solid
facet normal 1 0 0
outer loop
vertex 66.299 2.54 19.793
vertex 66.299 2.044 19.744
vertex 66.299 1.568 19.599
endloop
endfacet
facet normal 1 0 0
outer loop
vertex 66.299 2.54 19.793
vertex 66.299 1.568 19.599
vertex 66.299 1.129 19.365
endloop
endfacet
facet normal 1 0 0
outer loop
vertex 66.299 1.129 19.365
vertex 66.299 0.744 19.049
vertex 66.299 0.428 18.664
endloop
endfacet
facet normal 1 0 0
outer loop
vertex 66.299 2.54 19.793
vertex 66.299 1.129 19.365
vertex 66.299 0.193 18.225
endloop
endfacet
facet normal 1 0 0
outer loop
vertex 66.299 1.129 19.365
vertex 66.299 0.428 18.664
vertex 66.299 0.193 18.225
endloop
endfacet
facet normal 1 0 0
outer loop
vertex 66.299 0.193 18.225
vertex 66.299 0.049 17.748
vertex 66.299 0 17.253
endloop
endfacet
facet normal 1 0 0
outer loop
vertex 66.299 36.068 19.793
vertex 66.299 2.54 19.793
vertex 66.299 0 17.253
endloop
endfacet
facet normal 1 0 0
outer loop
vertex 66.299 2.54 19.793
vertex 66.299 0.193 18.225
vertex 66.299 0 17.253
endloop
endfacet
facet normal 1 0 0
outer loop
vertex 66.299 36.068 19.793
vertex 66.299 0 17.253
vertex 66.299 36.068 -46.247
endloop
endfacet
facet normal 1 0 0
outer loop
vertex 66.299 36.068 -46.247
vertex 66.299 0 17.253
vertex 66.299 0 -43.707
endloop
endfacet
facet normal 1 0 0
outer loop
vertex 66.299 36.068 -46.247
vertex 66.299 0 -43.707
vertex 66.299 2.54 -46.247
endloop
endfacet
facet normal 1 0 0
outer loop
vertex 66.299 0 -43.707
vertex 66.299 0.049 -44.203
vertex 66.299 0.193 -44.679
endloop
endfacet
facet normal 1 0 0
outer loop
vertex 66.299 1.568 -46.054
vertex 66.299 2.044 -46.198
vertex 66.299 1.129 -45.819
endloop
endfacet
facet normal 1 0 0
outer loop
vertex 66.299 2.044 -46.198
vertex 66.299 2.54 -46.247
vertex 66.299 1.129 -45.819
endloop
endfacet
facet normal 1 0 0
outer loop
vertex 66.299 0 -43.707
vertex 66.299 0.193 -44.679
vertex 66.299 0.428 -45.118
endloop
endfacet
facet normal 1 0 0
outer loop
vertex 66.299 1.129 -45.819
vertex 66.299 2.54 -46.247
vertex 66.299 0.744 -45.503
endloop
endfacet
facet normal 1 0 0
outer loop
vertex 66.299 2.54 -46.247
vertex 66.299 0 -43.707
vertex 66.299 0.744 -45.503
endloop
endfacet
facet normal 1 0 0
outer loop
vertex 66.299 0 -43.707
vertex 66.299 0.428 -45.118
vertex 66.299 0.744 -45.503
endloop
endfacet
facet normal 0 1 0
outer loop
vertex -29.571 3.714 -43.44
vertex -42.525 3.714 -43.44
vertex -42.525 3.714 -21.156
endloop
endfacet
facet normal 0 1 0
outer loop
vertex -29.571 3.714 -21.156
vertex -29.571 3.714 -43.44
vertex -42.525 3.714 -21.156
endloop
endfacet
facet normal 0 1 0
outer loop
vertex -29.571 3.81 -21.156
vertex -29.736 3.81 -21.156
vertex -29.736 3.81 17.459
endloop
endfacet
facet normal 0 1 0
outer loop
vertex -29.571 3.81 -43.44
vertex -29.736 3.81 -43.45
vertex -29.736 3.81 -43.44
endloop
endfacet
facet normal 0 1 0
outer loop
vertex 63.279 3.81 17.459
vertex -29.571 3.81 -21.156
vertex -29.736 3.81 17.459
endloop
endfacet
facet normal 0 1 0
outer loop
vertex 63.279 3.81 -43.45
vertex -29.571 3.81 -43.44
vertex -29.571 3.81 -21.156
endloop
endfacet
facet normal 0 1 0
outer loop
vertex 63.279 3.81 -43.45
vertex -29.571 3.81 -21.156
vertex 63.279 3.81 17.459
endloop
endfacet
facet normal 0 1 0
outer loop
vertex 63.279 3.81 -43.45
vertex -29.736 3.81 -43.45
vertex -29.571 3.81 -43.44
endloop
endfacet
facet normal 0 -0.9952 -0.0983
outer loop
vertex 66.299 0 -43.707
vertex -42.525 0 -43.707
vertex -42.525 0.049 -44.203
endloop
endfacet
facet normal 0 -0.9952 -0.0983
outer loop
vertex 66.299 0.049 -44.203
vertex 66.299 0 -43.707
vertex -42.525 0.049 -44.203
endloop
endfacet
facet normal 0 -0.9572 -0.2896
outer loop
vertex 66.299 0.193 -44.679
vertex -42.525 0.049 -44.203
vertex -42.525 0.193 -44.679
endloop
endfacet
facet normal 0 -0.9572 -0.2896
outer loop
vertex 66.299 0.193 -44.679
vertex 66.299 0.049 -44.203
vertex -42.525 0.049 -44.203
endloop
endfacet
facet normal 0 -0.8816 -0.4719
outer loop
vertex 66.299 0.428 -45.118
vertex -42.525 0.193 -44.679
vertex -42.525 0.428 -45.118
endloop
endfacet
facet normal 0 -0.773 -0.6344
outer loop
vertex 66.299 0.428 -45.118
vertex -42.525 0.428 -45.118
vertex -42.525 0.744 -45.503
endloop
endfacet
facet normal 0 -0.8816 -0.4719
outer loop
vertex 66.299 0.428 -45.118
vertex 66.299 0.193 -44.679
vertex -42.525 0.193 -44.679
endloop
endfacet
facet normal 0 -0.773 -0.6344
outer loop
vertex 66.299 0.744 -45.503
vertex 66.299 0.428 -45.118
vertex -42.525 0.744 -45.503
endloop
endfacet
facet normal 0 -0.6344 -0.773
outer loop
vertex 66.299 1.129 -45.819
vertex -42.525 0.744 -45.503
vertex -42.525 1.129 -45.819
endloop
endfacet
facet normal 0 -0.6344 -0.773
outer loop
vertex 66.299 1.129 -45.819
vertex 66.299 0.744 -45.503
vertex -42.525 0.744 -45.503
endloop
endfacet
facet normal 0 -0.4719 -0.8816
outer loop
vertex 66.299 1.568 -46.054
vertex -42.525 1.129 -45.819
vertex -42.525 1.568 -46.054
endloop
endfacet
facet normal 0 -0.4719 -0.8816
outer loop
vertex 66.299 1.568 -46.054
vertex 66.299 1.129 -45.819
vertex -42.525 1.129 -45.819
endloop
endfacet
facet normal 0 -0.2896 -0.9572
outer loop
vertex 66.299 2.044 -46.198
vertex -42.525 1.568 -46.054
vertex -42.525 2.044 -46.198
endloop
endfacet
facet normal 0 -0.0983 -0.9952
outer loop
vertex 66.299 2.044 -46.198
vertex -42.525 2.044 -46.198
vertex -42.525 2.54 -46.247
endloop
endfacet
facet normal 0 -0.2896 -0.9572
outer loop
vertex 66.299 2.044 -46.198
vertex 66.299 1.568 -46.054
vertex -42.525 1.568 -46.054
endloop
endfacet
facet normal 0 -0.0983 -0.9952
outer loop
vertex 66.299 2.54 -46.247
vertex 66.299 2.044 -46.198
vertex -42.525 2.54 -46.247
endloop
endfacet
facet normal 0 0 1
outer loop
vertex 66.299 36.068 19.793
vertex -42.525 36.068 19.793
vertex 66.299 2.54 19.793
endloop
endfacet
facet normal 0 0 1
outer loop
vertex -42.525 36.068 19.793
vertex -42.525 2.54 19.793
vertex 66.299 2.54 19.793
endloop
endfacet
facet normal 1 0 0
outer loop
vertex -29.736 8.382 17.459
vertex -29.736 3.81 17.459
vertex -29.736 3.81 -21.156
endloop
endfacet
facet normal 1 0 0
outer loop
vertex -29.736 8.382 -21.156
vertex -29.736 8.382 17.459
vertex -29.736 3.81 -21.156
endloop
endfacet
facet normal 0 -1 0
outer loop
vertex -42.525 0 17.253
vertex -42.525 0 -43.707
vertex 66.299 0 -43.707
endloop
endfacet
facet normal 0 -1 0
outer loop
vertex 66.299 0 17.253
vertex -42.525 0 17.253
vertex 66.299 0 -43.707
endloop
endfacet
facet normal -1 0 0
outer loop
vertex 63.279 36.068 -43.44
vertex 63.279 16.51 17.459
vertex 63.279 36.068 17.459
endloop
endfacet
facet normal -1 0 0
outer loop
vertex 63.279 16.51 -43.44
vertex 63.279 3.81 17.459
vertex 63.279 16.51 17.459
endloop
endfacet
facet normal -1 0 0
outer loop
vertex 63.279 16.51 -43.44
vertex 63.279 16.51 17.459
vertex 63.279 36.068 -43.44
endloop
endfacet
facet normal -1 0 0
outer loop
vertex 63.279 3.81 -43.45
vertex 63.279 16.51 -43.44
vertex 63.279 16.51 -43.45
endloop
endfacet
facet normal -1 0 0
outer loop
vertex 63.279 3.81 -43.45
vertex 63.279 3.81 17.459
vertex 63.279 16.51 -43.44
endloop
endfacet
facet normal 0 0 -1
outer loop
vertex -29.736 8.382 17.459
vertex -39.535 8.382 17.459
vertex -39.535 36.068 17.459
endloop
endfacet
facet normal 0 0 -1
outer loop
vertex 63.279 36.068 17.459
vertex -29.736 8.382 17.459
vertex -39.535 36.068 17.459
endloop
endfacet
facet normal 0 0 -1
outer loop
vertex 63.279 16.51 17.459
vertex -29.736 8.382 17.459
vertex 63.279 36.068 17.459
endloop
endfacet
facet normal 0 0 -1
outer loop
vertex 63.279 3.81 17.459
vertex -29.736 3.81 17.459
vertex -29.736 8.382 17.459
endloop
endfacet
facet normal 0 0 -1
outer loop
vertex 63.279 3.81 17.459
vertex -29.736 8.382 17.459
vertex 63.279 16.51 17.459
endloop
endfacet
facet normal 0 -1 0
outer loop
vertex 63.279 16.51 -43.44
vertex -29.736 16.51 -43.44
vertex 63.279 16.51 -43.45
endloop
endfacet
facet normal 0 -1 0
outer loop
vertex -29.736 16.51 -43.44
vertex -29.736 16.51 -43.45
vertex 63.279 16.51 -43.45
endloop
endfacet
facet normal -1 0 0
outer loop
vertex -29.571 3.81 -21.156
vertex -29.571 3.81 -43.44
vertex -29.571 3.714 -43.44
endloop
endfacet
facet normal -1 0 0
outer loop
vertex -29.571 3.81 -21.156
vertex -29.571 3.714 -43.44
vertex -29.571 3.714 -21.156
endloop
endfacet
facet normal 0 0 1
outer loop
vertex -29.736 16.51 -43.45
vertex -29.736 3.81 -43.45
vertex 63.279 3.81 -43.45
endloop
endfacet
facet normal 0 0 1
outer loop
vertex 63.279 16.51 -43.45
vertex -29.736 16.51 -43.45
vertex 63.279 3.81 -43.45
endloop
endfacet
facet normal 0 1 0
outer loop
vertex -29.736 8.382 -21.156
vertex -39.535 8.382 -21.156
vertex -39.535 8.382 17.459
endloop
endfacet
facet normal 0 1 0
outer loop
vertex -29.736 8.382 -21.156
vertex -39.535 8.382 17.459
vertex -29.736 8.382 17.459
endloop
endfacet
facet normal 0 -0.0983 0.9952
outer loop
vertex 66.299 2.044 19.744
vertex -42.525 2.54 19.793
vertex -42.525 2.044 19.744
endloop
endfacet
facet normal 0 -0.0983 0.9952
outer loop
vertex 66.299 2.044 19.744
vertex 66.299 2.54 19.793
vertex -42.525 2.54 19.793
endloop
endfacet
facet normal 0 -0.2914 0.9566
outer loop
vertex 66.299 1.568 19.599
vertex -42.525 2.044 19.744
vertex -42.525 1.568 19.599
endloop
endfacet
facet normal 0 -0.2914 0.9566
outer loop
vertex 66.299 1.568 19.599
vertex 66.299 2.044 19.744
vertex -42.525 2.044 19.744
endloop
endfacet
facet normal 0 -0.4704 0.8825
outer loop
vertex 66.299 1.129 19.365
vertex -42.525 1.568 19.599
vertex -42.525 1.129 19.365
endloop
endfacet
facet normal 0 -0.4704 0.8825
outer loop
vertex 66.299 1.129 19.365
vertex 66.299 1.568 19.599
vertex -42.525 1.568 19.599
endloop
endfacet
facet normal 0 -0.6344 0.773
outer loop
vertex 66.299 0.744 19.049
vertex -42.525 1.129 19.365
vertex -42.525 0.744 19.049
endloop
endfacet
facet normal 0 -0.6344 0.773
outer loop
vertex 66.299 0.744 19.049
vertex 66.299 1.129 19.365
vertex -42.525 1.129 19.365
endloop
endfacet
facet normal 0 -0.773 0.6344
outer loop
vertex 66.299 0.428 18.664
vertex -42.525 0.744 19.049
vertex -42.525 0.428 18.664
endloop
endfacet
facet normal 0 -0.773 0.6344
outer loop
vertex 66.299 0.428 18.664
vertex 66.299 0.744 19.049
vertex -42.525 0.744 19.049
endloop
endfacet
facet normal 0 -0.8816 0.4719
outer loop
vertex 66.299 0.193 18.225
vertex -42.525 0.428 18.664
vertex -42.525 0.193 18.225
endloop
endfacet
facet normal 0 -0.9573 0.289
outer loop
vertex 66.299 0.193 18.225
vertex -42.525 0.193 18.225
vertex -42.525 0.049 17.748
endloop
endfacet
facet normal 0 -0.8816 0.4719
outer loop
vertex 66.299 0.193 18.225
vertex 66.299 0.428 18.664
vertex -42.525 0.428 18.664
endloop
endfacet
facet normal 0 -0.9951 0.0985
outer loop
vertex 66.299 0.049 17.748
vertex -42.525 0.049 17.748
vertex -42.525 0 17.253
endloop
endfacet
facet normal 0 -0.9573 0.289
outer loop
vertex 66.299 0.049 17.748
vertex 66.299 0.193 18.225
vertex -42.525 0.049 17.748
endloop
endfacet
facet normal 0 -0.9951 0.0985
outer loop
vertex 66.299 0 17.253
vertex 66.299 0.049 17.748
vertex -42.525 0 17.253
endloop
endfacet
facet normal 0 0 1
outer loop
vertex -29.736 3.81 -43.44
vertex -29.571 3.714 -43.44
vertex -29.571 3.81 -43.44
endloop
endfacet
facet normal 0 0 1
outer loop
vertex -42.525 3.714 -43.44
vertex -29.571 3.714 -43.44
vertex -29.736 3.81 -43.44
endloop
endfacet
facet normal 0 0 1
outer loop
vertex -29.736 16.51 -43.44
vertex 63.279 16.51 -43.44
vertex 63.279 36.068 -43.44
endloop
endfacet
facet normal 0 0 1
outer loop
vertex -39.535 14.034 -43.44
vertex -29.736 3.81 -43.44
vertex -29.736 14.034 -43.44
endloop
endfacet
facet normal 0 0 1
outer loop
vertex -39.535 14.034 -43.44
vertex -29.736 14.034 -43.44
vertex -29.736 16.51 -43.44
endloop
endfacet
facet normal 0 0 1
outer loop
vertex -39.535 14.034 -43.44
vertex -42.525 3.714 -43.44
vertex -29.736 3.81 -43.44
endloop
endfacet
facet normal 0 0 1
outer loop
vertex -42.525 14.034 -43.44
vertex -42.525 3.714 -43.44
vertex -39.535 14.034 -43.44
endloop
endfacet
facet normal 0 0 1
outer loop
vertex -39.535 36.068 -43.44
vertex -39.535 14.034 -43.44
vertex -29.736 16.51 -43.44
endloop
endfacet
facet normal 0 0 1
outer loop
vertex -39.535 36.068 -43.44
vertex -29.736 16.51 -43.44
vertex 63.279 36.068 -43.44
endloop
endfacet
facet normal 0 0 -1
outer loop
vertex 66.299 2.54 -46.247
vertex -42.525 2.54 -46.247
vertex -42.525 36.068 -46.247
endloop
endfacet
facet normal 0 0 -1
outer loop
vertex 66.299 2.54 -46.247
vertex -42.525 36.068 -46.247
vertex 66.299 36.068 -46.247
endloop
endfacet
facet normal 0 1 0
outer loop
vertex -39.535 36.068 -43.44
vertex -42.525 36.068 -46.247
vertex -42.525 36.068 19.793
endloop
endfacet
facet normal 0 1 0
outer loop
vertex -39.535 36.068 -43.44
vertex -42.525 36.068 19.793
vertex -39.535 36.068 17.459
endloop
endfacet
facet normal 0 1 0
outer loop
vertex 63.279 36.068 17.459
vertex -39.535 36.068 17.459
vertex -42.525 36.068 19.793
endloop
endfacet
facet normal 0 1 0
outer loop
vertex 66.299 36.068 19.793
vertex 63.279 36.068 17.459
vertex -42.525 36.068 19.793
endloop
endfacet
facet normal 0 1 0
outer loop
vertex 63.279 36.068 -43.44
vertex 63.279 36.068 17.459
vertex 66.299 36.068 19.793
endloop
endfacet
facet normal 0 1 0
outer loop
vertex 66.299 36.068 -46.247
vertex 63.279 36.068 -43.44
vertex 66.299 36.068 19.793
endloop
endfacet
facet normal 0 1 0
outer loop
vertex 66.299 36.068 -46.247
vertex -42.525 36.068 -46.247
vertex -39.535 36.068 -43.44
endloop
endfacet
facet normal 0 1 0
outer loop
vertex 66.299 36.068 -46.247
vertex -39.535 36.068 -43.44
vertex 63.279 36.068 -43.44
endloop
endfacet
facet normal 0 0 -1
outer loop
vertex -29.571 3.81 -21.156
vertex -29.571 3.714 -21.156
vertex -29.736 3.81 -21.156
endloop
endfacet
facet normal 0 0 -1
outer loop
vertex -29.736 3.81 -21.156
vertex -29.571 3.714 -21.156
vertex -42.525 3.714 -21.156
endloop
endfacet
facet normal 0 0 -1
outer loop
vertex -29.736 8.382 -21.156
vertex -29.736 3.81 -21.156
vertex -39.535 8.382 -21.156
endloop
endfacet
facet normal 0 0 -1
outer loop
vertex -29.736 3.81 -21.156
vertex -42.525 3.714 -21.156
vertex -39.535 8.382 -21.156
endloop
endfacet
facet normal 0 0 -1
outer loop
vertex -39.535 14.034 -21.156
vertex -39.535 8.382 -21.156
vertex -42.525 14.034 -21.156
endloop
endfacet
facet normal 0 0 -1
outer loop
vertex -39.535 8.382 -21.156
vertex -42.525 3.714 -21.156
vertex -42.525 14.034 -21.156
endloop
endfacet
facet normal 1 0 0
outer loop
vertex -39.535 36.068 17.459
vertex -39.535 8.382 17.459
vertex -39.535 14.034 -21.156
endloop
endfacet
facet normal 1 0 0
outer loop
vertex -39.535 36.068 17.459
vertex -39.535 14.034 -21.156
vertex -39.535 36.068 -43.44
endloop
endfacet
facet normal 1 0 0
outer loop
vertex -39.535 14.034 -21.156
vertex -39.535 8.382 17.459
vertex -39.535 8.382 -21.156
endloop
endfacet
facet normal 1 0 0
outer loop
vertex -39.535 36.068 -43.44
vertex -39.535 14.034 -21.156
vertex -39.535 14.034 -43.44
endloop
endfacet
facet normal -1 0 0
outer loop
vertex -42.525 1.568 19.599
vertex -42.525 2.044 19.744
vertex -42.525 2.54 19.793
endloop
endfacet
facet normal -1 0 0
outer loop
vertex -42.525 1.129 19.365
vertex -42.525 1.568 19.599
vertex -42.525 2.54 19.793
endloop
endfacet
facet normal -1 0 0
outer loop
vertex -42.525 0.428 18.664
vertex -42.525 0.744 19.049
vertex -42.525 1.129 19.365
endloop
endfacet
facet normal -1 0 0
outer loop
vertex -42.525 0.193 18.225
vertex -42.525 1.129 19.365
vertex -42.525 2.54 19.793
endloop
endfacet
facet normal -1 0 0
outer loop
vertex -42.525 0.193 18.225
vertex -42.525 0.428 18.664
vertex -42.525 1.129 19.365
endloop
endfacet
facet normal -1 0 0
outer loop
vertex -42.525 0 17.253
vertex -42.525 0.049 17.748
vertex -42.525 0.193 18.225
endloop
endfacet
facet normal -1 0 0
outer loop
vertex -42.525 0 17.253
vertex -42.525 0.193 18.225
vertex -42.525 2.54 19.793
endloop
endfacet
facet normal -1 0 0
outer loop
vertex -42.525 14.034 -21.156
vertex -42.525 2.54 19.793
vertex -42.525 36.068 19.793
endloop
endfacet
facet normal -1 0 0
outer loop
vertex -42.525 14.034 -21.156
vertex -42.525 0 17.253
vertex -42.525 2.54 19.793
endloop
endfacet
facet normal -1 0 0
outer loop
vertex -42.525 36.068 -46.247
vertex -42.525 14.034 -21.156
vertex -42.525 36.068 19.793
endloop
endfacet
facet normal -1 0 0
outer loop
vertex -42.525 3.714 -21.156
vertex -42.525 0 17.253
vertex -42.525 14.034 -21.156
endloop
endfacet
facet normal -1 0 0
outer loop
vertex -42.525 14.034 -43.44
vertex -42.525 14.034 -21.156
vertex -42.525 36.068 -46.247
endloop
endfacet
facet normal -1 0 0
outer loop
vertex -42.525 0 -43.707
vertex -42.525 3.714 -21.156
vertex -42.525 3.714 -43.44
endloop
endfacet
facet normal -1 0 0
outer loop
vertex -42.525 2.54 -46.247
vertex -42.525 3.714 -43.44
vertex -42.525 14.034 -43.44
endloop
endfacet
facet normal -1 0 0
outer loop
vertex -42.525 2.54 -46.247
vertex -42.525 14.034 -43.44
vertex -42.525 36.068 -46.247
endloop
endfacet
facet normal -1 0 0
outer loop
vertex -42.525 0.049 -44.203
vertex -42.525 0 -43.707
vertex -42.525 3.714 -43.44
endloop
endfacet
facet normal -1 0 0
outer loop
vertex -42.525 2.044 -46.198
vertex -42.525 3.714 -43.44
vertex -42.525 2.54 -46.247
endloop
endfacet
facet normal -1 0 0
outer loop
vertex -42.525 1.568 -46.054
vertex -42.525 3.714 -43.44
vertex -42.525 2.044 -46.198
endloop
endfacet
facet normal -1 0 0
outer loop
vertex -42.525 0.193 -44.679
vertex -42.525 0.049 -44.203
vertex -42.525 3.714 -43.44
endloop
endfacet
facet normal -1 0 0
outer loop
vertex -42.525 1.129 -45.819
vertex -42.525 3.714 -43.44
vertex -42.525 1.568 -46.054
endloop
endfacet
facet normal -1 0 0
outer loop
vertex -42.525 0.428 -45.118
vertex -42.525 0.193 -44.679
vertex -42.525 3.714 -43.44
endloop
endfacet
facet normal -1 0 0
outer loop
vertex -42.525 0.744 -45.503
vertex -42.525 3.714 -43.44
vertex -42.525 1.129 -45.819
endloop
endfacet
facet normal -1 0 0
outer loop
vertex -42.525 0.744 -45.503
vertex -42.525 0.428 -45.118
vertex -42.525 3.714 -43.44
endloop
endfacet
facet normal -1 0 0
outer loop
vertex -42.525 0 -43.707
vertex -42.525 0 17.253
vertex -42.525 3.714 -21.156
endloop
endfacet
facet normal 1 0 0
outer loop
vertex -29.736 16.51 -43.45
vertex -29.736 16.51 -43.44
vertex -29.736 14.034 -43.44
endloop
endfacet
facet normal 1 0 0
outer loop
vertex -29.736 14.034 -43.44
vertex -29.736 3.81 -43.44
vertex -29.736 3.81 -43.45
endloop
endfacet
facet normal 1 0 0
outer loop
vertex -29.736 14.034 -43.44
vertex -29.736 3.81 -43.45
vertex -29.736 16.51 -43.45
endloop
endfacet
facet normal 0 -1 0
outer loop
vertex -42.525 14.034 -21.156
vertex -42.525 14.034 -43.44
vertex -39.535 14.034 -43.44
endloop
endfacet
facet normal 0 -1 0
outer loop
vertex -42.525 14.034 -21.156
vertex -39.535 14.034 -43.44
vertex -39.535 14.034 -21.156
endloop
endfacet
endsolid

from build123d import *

# Parameters (mm, degrees)
SKETCH1_W           = 108.824103019
SKETCH1_H           = 66.04
BOSS_EXTRUDE4_DEPTH = 3.81
SKETCH5_W           = 108.824103019
SKETCH5_H           = 66.04
SKETCH5_W_2         = 93.0148
SKETCH5_H_2         = 60.9092
BOSS_EXTRUDE5_DEPTH = 12.7
SKETCH6_W           = 22.284444933
SKETCH6_H           = 10.320659342
CUT_EXTRUDE2_DEPTH  = 12.954
FILLET2_R           = 2.54
FILLET3_R           = 2.54
SKETCH8_W           = 9.964328511
SKETCH8_H           = 60.899089628
CUT_EXTRUDE4_DEPTH  = 8.128
SKETCH11_W          = 108.824103019
SKETCH11_H          = 66.04
SKETCH11_W_2        = 102.814143763
SKETCH11_H_2        = 60.899089628
BOSS_EXTRUDE6_DEPTH = 19.558


with BuildPart() as part:
    # Sketch1 → Boss-Extrude4 (new body)
    with BuildSketch(Plane(origin=(0, 0, 0), x_dir=(1, 0, 0), z_dir=(0, 1, 0))):
        with Locations((11.887002401, 13.227171797)):
            Rectangle(SKETCH1_W, SKETCH1_H)
    extrude(amount=BOSS_EXTRUDE4_DEPTH)

    # Sketch5 → Boss-Extrude5 (add)
    with BuildSketch(Plane(origin=(0, 3.81, 0), x_dir=(1, 0, 0), z_dir=(0, 1, 0))):
        with Locations((11.887002401, 13.227171797)):
            Rectangle(SKETCH5_W, SKETCH5_H)
        with Locations((16.771366144, 12.995675742)):
            Rectangle(SKETCH5_W_2, SKETCH5_H_2, mode=Mode.SUBTRACT)
    extrude(amount=BOSS_EXTRUDE5_DEPTH)

    # Sketch6 → Cut-Extrude2 (cut)
    with BuildSketch(Plane.ZY.offset(42.525049108)):
        with Locations((-32.297942904, 8.873970447)):
            Rectangle(SKETCH6_W, SKETCH6_H)
    extrude(amount=-CUT_EXTRUDE2_DEPTH, mode=Mode.SUBTRACT)

    # Fillet2
    fillet2_edges = [part.edges().sort_by_distance(p)[0] for p in [
        (11.887002402, 0, 19.792828203),
    ]]
    fillet(fillet2_edges, radius=FILLET2_R)

    # Fillet3
    fillet3_edges = [part.edges().sort_by_distance(p)[0] for p in [
        (11.887002402, 0, -46.247171797),
    ]]
    fillet(fillet3_edges, radius=FILLET3_R)

    # Sketch8 → Cut-Extrude4 (cut)
    with BuildSketch(Plane(origin=(0, 16.51, 0), x_dir=(1, 0, 0), z_dir=(0, 1, 0))):
        with Locations((-34.553213363, 12.990620556)):
            Rectangle(SKETCH8_W, SKETCH8_H)
    extrude(amount=-CUT_EXTRUDE4_DEPTH, mode=Mode.SUBTRACT)

    # Sketch11 → Boss-Extrude6 (add)
    with BuildSketch(Plane(origin=(0, 16.51, 0), x_dir=(1, 0, 0), z_dir=(0, 1, 0))):
        with Locations((11.887002401, 13.227171797)):
            Rectangle(SKETCH11_W, SKETCH11_H)
        with Locations((11.871694263, 12.990620556)):
            Rectangle(SKETCH11_W_2, SKETCH11_H_2, mode=Mode.SUBTRACT)
    extrude(amount=BOSS_EXTRUDE6_DEPTH)


solid = part.part
